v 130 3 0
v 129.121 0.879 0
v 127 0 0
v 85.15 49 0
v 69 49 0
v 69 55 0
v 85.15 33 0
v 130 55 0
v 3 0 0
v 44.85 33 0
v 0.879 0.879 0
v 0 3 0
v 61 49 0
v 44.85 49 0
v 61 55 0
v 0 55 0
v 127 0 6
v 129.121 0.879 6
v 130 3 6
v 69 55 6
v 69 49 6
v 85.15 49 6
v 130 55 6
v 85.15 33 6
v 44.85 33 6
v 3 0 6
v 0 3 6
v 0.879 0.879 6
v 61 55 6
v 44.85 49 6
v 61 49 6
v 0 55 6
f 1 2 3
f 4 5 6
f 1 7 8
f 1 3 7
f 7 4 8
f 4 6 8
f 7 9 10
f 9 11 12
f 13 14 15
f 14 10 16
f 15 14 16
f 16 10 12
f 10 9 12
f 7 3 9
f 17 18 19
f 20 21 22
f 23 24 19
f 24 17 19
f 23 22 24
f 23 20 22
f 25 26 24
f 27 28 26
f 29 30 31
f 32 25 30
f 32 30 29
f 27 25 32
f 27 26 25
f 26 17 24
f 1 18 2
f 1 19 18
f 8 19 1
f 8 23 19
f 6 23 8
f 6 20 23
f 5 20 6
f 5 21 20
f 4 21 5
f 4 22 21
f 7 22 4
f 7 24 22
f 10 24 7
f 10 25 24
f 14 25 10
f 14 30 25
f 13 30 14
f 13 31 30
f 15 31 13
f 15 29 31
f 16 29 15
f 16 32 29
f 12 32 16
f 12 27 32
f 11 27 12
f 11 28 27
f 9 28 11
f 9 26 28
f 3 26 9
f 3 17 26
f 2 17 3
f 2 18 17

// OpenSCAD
$fn = 32;

// ----------------------------------------------------------------------
// Window plate: 130 x 55 mm, 1 open windows
// ----------------------------------------------------------------------

// --- parameters (mm) ---
profile_height = 6;       // extrusion height
profile_points = 16;      // points of the closed outline

profile = [[0, 3], [0.879, 0.879], [3, 0], [127, 0], [129.121, 0.879], [130, 3], [130, 55], [69, 55], [69, 49], [85.15, 49], [85.15, 33], [44.85, 33], [44.85, 49], [61, 49], [61, 55], [0, 55]];  // single closed polygon, 16 points, counter clockwise

// --- the one profile operation ---
linear_extrude(height = profile_height) polygon(points = profile);
